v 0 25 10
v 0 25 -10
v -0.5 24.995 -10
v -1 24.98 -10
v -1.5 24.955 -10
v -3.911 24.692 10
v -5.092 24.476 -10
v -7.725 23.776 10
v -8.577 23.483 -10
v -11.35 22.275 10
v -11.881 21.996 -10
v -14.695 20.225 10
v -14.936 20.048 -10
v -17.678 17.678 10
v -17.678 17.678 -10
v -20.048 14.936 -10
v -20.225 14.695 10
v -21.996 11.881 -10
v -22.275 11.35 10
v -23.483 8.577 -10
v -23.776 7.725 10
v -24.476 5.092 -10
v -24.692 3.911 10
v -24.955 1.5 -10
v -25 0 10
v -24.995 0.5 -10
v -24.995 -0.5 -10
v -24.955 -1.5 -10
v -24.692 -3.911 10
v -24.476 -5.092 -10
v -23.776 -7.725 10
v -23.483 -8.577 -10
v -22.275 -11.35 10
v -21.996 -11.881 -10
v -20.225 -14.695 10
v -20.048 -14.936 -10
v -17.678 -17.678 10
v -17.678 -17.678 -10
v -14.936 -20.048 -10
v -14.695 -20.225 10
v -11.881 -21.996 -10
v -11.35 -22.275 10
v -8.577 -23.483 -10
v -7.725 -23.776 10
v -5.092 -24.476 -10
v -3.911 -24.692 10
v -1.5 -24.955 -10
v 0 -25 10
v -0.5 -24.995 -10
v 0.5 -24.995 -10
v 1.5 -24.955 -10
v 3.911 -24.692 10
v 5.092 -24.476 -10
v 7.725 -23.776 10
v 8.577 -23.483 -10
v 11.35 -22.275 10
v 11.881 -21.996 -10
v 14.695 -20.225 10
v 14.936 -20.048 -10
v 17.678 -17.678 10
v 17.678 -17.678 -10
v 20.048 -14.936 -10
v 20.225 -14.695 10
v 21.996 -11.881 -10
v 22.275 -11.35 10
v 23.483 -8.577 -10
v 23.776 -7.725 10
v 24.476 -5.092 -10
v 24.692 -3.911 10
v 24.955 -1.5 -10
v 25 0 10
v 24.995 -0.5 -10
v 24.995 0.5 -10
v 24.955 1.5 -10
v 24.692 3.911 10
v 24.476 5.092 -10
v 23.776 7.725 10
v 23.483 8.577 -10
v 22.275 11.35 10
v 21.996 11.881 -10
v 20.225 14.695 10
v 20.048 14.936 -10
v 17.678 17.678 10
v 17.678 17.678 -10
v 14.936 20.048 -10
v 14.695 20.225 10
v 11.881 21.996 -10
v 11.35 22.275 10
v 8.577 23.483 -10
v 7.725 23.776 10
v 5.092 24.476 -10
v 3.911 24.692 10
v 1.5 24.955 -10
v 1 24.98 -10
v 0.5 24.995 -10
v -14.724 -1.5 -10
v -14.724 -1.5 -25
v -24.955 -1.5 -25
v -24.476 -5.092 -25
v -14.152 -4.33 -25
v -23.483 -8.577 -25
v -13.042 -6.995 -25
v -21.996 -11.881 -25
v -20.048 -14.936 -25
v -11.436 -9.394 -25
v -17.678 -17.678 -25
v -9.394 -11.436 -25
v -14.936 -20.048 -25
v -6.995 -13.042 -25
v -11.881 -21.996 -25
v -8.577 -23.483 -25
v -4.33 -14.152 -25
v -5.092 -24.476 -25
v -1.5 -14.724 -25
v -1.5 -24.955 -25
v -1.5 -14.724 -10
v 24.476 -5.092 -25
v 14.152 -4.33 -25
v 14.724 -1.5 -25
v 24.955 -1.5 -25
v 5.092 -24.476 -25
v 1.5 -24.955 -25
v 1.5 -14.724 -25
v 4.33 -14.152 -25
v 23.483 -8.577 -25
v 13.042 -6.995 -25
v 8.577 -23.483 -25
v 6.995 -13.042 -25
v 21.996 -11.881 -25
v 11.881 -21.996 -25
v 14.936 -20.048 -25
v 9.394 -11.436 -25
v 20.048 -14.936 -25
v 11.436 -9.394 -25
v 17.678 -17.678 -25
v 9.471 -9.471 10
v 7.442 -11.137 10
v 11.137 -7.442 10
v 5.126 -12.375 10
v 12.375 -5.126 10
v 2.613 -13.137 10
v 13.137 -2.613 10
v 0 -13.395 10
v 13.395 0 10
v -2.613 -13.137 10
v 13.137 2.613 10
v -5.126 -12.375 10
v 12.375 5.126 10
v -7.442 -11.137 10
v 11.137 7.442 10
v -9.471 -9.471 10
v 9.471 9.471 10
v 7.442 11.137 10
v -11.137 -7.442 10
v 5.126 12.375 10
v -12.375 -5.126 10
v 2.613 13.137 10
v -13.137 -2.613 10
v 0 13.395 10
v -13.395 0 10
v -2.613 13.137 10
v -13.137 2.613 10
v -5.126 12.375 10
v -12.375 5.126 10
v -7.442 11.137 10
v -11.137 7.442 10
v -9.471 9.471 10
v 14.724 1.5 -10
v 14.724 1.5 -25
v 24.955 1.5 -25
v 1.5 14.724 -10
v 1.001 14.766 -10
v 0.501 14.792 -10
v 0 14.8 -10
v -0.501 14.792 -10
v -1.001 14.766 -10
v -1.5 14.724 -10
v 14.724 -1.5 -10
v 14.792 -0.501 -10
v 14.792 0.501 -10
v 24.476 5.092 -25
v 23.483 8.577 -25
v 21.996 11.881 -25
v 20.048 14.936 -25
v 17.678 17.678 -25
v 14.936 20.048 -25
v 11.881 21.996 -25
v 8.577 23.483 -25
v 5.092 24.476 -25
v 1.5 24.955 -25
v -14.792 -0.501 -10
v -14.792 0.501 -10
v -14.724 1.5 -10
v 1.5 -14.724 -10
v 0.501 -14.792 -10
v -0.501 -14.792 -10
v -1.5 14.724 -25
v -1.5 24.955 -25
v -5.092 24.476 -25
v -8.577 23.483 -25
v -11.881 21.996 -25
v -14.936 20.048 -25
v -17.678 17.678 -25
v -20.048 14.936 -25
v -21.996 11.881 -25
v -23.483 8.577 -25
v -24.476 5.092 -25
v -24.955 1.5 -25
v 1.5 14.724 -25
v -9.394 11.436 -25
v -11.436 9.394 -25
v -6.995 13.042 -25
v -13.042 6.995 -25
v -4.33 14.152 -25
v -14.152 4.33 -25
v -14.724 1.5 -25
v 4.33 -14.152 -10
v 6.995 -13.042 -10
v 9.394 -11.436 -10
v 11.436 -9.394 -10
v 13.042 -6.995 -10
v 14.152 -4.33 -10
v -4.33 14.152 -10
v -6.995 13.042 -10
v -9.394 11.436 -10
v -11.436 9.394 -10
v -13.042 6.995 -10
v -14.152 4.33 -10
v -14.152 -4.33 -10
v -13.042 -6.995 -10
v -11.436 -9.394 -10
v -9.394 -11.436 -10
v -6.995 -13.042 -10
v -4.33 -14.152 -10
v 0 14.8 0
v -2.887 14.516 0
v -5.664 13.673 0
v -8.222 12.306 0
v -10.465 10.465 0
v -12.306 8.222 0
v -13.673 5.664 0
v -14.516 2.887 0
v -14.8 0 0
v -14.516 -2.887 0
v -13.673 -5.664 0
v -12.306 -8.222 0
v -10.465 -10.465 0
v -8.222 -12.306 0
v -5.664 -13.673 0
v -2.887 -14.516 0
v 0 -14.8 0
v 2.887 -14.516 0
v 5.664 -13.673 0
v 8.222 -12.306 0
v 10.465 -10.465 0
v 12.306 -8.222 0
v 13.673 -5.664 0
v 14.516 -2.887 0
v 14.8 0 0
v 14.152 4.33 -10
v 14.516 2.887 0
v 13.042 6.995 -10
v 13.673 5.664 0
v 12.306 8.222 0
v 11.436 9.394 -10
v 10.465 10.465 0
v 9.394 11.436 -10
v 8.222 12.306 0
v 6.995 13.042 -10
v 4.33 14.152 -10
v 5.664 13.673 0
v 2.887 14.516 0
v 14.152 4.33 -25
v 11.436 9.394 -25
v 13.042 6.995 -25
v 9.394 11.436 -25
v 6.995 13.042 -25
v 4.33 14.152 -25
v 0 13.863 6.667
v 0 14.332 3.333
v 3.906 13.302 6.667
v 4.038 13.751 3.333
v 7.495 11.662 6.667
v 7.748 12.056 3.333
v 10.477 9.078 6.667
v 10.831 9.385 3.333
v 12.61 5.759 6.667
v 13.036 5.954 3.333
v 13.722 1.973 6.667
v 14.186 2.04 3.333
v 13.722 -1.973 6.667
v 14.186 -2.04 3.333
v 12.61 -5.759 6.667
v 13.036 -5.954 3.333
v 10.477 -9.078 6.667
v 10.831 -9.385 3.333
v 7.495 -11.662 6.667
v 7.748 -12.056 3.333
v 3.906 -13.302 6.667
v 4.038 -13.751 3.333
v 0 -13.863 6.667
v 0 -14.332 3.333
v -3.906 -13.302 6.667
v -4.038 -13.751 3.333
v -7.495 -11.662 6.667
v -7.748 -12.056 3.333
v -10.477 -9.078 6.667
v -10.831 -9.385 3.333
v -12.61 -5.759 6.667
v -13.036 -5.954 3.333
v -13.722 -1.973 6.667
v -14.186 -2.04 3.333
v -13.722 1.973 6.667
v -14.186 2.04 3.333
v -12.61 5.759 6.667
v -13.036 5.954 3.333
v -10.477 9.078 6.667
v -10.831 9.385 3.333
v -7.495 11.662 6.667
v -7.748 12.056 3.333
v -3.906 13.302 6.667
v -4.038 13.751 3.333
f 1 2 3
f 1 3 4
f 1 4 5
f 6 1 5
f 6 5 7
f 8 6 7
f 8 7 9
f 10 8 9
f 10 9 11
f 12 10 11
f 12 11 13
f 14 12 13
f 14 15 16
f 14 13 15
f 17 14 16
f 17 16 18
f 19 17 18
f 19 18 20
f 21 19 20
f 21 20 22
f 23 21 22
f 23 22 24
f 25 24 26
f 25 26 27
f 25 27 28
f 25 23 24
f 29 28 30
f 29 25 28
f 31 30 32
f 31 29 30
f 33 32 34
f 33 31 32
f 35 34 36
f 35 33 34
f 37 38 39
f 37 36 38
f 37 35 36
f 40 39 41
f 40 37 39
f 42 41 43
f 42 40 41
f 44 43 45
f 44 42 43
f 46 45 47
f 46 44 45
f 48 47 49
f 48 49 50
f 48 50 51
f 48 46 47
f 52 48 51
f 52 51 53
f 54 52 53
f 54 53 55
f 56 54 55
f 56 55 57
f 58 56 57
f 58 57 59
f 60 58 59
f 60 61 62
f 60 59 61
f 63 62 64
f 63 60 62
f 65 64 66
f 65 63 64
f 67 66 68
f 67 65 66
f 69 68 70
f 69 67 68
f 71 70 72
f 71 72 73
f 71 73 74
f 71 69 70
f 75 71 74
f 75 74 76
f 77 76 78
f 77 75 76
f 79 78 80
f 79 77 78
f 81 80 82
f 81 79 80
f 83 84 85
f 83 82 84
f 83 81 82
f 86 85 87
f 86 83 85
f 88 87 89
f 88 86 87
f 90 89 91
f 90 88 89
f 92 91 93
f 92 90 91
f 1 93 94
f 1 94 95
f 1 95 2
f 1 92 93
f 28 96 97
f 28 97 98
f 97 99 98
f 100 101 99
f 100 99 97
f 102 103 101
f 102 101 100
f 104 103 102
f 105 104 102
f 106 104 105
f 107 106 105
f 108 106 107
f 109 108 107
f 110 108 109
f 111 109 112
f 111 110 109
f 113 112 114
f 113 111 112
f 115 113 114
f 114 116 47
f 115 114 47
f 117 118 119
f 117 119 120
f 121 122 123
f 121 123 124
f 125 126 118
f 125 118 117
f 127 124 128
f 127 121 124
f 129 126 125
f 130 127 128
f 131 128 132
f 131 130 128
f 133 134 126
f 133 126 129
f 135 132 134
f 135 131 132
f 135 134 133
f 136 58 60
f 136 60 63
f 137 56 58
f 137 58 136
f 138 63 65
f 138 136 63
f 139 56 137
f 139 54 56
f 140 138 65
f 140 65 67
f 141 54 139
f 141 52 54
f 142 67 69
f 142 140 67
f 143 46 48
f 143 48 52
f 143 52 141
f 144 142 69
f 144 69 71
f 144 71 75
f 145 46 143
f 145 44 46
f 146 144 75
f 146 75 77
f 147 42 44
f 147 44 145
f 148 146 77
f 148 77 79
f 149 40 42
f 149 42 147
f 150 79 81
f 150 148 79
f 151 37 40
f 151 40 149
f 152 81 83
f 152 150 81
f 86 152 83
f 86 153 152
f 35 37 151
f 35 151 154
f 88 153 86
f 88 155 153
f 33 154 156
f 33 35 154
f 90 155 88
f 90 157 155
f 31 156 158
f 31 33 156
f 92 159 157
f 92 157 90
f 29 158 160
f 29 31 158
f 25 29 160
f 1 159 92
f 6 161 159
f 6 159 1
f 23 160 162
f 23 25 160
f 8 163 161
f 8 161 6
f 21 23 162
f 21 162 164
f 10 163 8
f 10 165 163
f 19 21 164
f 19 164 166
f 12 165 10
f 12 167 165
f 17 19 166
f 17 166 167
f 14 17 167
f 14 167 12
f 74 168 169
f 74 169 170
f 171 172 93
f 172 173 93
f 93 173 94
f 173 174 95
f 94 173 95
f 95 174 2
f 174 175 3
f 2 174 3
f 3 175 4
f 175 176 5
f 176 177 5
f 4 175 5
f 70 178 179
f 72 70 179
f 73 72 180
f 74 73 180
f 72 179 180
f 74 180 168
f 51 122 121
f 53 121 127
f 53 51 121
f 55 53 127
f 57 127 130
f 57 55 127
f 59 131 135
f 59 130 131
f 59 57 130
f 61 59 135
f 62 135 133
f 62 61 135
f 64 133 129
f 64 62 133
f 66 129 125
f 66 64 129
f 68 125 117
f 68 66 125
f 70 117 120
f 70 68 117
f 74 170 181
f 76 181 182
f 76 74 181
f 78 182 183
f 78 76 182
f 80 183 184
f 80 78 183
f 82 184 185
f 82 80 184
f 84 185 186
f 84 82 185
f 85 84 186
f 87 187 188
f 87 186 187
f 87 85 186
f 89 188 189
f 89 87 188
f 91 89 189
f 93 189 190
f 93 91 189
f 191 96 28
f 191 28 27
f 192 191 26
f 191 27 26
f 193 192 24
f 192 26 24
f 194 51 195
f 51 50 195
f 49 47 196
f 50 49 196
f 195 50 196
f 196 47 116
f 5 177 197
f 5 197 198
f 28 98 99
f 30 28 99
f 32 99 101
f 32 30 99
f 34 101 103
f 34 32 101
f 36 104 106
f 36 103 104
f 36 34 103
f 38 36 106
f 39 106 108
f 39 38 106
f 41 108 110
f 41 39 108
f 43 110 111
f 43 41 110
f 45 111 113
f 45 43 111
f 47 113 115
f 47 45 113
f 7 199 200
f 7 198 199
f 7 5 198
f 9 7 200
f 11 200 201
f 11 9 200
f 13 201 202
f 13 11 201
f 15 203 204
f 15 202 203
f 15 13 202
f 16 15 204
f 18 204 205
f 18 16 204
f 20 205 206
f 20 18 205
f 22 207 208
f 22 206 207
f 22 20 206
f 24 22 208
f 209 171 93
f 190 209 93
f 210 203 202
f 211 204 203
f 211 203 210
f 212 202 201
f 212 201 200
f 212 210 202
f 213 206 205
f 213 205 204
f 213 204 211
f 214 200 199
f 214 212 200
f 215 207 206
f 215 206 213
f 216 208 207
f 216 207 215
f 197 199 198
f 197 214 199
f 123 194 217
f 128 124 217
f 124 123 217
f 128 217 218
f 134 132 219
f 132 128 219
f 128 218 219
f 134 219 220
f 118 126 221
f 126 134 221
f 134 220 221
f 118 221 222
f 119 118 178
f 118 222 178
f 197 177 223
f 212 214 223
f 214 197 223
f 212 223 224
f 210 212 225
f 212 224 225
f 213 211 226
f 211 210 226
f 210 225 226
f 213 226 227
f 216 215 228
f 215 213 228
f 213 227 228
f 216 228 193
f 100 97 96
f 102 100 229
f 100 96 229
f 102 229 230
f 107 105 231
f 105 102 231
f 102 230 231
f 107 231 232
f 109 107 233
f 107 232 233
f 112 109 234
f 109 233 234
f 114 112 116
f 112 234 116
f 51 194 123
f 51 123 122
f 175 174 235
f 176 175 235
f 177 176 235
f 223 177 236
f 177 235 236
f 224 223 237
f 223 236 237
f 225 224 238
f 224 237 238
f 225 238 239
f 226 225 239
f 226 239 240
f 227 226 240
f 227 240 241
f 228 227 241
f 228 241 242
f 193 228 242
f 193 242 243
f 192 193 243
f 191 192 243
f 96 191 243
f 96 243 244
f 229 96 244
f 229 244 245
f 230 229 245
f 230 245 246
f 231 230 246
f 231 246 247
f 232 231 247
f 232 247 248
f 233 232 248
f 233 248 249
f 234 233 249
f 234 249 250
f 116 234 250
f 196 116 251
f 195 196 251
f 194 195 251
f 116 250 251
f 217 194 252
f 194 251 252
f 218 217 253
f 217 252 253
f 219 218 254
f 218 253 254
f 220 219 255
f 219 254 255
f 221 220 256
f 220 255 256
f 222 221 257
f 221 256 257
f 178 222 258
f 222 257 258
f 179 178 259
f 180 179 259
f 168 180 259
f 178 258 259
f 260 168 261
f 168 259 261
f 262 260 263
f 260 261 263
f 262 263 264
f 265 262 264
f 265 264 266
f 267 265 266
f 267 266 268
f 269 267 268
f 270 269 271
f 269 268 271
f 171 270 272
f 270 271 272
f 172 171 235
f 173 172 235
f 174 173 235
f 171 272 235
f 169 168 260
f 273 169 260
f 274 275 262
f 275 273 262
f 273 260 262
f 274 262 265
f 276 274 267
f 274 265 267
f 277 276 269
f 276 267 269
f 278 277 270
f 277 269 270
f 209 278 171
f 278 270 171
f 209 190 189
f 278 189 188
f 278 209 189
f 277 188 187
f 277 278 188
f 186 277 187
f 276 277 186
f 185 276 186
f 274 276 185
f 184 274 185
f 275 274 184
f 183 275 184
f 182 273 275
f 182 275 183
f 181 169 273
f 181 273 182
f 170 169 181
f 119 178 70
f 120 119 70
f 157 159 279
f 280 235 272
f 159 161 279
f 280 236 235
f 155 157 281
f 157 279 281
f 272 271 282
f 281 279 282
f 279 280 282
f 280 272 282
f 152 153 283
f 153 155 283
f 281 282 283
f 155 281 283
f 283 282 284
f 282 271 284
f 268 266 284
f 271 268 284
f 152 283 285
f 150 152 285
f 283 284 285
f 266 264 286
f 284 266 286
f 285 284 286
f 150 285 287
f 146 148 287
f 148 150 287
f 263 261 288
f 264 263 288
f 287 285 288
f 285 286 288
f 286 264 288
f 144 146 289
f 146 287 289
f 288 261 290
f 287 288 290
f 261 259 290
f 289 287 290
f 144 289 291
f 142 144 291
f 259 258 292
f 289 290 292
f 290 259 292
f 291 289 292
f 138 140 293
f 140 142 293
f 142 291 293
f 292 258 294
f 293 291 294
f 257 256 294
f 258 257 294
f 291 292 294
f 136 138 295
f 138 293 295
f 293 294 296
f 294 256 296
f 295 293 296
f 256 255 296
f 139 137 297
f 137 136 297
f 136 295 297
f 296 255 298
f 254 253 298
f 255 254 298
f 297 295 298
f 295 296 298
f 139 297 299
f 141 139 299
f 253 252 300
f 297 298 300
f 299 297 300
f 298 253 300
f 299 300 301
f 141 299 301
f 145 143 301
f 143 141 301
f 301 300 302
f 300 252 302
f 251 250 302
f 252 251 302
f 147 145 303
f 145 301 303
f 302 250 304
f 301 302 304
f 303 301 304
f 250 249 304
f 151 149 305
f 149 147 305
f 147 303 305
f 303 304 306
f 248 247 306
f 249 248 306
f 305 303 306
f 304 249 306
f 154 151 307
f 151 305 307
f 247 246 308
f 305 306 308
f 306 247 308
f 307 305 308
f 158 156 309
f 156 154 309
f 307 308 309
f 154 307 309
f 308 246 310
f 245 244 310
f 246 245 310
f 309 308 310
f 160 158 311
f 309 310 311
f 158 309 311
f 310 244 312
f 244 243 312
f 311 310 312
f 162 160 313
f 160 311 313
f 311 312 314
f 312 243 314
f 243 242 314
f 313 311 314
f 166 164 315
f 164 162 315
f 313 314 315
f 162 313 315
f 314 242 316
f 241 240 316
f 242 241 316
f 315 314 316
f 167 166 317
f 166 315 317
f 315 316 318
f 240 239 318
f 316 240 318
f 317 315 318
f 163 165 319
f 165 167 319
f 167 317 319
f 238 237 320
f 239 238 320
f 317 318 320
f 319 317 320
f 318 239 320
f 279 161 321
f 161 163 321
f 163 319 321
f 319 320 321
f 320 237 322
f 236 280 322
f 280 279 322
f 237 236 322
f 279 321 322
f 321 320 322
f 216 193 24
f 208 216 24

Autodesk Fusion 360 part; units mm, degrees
sketch "Sketch4" plane through (0, 0, 0) normal (0, 0, 1) x (1, 0, 0)
  circle A0 centre (0, 0) radius 25 construction
  dimension "d8" = 50
sketch "Sketch6" plane through (0, 0, 0) normal (1, 0, 0) x (0, 1, 0)
  line L0 (0, 0) -> (25, 0) construction
  line L1 (25, 0) -> (25, 10)
  line L2 (0, 0) -> (14.8, 0) construction
  line L3 (14.8, 0) -> (14.8, 10) construction
  line L4 (14.8, 10) -> (25, 10) construction
  line L5 (25, 10) -> (11.5, 10) construction
  line L6 (14.8, 0) -> (13.3946, 10) construction
  line L7 (14.8, 0) -> (24.8983, 0) construction
  line L8 (25, 10) -> (13.3946, 10)
  line L9 (13.3946, 10) -> (14.8, 0)
  line L10 (25, 0) -> (14.8, 0)
  dimension "d9" = 25
  dimension "d10" = 10
  dimension "d11" = 14.8
  dimension "d12" = 98
revolve "Revolve1" add sketch "Sketch6" angle 360 about axis through (0, 0, 1.75) along (0, 0, 1)
sketch "Sketch7" plane through (0, 0, 0) normal (0, 0, -1) x (1, 0, 0)
  circle A0 centre (0, 0) radius 25
  circle A1 centre (0, 0) radius 14.8
extrude "Extrude3" add 1 faces at (1.9773, 21.4518, 0) along direction (0, 0, -1) blind 10
sketch "Sketch8" plane through (0, 0, -10) normal (0, 0, -1) x (1, 0, 0)
  circle A0 centre (0, 0) radius 25
  circle A1 centre (0, 0) radius 14.8
  circle A2 centre (0, 0) radius 14.8
  circle A3 centre (0, 0) radius 25
  line L0 (1.5, 14.7238) -> (1.5, 24.955)
  line L1 (-1.5, 14.7238) -> (-1.5, 24.955)
  line L2 (-14.7238, 1.5) -> (-24.955, 1.5)
  line L3 (-14.7238, -1.5) -> (-24.955, -1.5)
  line L4 (-1.5, -14.7238) -> (-1.5, -24.955)
  line L5 (1.5, -14.7238) -> (1.5, -24.955)
  line L6 (14.7238, -1.5) -> (24.955, -1.5)
  line L7 (14.7238, 1.5) -> (24.955, 1.5)
  dimension "d19" = 360
extrude "Extrude4" add sketch "Sketch8" along normal blind 15 contours A0 A1 A2 A3 L0 L7 | A0 A1 A2 A3 L5 L6 | A0 A1 A2 A3 L1 L2 | A0 A1 A2 A3 L3 L4
